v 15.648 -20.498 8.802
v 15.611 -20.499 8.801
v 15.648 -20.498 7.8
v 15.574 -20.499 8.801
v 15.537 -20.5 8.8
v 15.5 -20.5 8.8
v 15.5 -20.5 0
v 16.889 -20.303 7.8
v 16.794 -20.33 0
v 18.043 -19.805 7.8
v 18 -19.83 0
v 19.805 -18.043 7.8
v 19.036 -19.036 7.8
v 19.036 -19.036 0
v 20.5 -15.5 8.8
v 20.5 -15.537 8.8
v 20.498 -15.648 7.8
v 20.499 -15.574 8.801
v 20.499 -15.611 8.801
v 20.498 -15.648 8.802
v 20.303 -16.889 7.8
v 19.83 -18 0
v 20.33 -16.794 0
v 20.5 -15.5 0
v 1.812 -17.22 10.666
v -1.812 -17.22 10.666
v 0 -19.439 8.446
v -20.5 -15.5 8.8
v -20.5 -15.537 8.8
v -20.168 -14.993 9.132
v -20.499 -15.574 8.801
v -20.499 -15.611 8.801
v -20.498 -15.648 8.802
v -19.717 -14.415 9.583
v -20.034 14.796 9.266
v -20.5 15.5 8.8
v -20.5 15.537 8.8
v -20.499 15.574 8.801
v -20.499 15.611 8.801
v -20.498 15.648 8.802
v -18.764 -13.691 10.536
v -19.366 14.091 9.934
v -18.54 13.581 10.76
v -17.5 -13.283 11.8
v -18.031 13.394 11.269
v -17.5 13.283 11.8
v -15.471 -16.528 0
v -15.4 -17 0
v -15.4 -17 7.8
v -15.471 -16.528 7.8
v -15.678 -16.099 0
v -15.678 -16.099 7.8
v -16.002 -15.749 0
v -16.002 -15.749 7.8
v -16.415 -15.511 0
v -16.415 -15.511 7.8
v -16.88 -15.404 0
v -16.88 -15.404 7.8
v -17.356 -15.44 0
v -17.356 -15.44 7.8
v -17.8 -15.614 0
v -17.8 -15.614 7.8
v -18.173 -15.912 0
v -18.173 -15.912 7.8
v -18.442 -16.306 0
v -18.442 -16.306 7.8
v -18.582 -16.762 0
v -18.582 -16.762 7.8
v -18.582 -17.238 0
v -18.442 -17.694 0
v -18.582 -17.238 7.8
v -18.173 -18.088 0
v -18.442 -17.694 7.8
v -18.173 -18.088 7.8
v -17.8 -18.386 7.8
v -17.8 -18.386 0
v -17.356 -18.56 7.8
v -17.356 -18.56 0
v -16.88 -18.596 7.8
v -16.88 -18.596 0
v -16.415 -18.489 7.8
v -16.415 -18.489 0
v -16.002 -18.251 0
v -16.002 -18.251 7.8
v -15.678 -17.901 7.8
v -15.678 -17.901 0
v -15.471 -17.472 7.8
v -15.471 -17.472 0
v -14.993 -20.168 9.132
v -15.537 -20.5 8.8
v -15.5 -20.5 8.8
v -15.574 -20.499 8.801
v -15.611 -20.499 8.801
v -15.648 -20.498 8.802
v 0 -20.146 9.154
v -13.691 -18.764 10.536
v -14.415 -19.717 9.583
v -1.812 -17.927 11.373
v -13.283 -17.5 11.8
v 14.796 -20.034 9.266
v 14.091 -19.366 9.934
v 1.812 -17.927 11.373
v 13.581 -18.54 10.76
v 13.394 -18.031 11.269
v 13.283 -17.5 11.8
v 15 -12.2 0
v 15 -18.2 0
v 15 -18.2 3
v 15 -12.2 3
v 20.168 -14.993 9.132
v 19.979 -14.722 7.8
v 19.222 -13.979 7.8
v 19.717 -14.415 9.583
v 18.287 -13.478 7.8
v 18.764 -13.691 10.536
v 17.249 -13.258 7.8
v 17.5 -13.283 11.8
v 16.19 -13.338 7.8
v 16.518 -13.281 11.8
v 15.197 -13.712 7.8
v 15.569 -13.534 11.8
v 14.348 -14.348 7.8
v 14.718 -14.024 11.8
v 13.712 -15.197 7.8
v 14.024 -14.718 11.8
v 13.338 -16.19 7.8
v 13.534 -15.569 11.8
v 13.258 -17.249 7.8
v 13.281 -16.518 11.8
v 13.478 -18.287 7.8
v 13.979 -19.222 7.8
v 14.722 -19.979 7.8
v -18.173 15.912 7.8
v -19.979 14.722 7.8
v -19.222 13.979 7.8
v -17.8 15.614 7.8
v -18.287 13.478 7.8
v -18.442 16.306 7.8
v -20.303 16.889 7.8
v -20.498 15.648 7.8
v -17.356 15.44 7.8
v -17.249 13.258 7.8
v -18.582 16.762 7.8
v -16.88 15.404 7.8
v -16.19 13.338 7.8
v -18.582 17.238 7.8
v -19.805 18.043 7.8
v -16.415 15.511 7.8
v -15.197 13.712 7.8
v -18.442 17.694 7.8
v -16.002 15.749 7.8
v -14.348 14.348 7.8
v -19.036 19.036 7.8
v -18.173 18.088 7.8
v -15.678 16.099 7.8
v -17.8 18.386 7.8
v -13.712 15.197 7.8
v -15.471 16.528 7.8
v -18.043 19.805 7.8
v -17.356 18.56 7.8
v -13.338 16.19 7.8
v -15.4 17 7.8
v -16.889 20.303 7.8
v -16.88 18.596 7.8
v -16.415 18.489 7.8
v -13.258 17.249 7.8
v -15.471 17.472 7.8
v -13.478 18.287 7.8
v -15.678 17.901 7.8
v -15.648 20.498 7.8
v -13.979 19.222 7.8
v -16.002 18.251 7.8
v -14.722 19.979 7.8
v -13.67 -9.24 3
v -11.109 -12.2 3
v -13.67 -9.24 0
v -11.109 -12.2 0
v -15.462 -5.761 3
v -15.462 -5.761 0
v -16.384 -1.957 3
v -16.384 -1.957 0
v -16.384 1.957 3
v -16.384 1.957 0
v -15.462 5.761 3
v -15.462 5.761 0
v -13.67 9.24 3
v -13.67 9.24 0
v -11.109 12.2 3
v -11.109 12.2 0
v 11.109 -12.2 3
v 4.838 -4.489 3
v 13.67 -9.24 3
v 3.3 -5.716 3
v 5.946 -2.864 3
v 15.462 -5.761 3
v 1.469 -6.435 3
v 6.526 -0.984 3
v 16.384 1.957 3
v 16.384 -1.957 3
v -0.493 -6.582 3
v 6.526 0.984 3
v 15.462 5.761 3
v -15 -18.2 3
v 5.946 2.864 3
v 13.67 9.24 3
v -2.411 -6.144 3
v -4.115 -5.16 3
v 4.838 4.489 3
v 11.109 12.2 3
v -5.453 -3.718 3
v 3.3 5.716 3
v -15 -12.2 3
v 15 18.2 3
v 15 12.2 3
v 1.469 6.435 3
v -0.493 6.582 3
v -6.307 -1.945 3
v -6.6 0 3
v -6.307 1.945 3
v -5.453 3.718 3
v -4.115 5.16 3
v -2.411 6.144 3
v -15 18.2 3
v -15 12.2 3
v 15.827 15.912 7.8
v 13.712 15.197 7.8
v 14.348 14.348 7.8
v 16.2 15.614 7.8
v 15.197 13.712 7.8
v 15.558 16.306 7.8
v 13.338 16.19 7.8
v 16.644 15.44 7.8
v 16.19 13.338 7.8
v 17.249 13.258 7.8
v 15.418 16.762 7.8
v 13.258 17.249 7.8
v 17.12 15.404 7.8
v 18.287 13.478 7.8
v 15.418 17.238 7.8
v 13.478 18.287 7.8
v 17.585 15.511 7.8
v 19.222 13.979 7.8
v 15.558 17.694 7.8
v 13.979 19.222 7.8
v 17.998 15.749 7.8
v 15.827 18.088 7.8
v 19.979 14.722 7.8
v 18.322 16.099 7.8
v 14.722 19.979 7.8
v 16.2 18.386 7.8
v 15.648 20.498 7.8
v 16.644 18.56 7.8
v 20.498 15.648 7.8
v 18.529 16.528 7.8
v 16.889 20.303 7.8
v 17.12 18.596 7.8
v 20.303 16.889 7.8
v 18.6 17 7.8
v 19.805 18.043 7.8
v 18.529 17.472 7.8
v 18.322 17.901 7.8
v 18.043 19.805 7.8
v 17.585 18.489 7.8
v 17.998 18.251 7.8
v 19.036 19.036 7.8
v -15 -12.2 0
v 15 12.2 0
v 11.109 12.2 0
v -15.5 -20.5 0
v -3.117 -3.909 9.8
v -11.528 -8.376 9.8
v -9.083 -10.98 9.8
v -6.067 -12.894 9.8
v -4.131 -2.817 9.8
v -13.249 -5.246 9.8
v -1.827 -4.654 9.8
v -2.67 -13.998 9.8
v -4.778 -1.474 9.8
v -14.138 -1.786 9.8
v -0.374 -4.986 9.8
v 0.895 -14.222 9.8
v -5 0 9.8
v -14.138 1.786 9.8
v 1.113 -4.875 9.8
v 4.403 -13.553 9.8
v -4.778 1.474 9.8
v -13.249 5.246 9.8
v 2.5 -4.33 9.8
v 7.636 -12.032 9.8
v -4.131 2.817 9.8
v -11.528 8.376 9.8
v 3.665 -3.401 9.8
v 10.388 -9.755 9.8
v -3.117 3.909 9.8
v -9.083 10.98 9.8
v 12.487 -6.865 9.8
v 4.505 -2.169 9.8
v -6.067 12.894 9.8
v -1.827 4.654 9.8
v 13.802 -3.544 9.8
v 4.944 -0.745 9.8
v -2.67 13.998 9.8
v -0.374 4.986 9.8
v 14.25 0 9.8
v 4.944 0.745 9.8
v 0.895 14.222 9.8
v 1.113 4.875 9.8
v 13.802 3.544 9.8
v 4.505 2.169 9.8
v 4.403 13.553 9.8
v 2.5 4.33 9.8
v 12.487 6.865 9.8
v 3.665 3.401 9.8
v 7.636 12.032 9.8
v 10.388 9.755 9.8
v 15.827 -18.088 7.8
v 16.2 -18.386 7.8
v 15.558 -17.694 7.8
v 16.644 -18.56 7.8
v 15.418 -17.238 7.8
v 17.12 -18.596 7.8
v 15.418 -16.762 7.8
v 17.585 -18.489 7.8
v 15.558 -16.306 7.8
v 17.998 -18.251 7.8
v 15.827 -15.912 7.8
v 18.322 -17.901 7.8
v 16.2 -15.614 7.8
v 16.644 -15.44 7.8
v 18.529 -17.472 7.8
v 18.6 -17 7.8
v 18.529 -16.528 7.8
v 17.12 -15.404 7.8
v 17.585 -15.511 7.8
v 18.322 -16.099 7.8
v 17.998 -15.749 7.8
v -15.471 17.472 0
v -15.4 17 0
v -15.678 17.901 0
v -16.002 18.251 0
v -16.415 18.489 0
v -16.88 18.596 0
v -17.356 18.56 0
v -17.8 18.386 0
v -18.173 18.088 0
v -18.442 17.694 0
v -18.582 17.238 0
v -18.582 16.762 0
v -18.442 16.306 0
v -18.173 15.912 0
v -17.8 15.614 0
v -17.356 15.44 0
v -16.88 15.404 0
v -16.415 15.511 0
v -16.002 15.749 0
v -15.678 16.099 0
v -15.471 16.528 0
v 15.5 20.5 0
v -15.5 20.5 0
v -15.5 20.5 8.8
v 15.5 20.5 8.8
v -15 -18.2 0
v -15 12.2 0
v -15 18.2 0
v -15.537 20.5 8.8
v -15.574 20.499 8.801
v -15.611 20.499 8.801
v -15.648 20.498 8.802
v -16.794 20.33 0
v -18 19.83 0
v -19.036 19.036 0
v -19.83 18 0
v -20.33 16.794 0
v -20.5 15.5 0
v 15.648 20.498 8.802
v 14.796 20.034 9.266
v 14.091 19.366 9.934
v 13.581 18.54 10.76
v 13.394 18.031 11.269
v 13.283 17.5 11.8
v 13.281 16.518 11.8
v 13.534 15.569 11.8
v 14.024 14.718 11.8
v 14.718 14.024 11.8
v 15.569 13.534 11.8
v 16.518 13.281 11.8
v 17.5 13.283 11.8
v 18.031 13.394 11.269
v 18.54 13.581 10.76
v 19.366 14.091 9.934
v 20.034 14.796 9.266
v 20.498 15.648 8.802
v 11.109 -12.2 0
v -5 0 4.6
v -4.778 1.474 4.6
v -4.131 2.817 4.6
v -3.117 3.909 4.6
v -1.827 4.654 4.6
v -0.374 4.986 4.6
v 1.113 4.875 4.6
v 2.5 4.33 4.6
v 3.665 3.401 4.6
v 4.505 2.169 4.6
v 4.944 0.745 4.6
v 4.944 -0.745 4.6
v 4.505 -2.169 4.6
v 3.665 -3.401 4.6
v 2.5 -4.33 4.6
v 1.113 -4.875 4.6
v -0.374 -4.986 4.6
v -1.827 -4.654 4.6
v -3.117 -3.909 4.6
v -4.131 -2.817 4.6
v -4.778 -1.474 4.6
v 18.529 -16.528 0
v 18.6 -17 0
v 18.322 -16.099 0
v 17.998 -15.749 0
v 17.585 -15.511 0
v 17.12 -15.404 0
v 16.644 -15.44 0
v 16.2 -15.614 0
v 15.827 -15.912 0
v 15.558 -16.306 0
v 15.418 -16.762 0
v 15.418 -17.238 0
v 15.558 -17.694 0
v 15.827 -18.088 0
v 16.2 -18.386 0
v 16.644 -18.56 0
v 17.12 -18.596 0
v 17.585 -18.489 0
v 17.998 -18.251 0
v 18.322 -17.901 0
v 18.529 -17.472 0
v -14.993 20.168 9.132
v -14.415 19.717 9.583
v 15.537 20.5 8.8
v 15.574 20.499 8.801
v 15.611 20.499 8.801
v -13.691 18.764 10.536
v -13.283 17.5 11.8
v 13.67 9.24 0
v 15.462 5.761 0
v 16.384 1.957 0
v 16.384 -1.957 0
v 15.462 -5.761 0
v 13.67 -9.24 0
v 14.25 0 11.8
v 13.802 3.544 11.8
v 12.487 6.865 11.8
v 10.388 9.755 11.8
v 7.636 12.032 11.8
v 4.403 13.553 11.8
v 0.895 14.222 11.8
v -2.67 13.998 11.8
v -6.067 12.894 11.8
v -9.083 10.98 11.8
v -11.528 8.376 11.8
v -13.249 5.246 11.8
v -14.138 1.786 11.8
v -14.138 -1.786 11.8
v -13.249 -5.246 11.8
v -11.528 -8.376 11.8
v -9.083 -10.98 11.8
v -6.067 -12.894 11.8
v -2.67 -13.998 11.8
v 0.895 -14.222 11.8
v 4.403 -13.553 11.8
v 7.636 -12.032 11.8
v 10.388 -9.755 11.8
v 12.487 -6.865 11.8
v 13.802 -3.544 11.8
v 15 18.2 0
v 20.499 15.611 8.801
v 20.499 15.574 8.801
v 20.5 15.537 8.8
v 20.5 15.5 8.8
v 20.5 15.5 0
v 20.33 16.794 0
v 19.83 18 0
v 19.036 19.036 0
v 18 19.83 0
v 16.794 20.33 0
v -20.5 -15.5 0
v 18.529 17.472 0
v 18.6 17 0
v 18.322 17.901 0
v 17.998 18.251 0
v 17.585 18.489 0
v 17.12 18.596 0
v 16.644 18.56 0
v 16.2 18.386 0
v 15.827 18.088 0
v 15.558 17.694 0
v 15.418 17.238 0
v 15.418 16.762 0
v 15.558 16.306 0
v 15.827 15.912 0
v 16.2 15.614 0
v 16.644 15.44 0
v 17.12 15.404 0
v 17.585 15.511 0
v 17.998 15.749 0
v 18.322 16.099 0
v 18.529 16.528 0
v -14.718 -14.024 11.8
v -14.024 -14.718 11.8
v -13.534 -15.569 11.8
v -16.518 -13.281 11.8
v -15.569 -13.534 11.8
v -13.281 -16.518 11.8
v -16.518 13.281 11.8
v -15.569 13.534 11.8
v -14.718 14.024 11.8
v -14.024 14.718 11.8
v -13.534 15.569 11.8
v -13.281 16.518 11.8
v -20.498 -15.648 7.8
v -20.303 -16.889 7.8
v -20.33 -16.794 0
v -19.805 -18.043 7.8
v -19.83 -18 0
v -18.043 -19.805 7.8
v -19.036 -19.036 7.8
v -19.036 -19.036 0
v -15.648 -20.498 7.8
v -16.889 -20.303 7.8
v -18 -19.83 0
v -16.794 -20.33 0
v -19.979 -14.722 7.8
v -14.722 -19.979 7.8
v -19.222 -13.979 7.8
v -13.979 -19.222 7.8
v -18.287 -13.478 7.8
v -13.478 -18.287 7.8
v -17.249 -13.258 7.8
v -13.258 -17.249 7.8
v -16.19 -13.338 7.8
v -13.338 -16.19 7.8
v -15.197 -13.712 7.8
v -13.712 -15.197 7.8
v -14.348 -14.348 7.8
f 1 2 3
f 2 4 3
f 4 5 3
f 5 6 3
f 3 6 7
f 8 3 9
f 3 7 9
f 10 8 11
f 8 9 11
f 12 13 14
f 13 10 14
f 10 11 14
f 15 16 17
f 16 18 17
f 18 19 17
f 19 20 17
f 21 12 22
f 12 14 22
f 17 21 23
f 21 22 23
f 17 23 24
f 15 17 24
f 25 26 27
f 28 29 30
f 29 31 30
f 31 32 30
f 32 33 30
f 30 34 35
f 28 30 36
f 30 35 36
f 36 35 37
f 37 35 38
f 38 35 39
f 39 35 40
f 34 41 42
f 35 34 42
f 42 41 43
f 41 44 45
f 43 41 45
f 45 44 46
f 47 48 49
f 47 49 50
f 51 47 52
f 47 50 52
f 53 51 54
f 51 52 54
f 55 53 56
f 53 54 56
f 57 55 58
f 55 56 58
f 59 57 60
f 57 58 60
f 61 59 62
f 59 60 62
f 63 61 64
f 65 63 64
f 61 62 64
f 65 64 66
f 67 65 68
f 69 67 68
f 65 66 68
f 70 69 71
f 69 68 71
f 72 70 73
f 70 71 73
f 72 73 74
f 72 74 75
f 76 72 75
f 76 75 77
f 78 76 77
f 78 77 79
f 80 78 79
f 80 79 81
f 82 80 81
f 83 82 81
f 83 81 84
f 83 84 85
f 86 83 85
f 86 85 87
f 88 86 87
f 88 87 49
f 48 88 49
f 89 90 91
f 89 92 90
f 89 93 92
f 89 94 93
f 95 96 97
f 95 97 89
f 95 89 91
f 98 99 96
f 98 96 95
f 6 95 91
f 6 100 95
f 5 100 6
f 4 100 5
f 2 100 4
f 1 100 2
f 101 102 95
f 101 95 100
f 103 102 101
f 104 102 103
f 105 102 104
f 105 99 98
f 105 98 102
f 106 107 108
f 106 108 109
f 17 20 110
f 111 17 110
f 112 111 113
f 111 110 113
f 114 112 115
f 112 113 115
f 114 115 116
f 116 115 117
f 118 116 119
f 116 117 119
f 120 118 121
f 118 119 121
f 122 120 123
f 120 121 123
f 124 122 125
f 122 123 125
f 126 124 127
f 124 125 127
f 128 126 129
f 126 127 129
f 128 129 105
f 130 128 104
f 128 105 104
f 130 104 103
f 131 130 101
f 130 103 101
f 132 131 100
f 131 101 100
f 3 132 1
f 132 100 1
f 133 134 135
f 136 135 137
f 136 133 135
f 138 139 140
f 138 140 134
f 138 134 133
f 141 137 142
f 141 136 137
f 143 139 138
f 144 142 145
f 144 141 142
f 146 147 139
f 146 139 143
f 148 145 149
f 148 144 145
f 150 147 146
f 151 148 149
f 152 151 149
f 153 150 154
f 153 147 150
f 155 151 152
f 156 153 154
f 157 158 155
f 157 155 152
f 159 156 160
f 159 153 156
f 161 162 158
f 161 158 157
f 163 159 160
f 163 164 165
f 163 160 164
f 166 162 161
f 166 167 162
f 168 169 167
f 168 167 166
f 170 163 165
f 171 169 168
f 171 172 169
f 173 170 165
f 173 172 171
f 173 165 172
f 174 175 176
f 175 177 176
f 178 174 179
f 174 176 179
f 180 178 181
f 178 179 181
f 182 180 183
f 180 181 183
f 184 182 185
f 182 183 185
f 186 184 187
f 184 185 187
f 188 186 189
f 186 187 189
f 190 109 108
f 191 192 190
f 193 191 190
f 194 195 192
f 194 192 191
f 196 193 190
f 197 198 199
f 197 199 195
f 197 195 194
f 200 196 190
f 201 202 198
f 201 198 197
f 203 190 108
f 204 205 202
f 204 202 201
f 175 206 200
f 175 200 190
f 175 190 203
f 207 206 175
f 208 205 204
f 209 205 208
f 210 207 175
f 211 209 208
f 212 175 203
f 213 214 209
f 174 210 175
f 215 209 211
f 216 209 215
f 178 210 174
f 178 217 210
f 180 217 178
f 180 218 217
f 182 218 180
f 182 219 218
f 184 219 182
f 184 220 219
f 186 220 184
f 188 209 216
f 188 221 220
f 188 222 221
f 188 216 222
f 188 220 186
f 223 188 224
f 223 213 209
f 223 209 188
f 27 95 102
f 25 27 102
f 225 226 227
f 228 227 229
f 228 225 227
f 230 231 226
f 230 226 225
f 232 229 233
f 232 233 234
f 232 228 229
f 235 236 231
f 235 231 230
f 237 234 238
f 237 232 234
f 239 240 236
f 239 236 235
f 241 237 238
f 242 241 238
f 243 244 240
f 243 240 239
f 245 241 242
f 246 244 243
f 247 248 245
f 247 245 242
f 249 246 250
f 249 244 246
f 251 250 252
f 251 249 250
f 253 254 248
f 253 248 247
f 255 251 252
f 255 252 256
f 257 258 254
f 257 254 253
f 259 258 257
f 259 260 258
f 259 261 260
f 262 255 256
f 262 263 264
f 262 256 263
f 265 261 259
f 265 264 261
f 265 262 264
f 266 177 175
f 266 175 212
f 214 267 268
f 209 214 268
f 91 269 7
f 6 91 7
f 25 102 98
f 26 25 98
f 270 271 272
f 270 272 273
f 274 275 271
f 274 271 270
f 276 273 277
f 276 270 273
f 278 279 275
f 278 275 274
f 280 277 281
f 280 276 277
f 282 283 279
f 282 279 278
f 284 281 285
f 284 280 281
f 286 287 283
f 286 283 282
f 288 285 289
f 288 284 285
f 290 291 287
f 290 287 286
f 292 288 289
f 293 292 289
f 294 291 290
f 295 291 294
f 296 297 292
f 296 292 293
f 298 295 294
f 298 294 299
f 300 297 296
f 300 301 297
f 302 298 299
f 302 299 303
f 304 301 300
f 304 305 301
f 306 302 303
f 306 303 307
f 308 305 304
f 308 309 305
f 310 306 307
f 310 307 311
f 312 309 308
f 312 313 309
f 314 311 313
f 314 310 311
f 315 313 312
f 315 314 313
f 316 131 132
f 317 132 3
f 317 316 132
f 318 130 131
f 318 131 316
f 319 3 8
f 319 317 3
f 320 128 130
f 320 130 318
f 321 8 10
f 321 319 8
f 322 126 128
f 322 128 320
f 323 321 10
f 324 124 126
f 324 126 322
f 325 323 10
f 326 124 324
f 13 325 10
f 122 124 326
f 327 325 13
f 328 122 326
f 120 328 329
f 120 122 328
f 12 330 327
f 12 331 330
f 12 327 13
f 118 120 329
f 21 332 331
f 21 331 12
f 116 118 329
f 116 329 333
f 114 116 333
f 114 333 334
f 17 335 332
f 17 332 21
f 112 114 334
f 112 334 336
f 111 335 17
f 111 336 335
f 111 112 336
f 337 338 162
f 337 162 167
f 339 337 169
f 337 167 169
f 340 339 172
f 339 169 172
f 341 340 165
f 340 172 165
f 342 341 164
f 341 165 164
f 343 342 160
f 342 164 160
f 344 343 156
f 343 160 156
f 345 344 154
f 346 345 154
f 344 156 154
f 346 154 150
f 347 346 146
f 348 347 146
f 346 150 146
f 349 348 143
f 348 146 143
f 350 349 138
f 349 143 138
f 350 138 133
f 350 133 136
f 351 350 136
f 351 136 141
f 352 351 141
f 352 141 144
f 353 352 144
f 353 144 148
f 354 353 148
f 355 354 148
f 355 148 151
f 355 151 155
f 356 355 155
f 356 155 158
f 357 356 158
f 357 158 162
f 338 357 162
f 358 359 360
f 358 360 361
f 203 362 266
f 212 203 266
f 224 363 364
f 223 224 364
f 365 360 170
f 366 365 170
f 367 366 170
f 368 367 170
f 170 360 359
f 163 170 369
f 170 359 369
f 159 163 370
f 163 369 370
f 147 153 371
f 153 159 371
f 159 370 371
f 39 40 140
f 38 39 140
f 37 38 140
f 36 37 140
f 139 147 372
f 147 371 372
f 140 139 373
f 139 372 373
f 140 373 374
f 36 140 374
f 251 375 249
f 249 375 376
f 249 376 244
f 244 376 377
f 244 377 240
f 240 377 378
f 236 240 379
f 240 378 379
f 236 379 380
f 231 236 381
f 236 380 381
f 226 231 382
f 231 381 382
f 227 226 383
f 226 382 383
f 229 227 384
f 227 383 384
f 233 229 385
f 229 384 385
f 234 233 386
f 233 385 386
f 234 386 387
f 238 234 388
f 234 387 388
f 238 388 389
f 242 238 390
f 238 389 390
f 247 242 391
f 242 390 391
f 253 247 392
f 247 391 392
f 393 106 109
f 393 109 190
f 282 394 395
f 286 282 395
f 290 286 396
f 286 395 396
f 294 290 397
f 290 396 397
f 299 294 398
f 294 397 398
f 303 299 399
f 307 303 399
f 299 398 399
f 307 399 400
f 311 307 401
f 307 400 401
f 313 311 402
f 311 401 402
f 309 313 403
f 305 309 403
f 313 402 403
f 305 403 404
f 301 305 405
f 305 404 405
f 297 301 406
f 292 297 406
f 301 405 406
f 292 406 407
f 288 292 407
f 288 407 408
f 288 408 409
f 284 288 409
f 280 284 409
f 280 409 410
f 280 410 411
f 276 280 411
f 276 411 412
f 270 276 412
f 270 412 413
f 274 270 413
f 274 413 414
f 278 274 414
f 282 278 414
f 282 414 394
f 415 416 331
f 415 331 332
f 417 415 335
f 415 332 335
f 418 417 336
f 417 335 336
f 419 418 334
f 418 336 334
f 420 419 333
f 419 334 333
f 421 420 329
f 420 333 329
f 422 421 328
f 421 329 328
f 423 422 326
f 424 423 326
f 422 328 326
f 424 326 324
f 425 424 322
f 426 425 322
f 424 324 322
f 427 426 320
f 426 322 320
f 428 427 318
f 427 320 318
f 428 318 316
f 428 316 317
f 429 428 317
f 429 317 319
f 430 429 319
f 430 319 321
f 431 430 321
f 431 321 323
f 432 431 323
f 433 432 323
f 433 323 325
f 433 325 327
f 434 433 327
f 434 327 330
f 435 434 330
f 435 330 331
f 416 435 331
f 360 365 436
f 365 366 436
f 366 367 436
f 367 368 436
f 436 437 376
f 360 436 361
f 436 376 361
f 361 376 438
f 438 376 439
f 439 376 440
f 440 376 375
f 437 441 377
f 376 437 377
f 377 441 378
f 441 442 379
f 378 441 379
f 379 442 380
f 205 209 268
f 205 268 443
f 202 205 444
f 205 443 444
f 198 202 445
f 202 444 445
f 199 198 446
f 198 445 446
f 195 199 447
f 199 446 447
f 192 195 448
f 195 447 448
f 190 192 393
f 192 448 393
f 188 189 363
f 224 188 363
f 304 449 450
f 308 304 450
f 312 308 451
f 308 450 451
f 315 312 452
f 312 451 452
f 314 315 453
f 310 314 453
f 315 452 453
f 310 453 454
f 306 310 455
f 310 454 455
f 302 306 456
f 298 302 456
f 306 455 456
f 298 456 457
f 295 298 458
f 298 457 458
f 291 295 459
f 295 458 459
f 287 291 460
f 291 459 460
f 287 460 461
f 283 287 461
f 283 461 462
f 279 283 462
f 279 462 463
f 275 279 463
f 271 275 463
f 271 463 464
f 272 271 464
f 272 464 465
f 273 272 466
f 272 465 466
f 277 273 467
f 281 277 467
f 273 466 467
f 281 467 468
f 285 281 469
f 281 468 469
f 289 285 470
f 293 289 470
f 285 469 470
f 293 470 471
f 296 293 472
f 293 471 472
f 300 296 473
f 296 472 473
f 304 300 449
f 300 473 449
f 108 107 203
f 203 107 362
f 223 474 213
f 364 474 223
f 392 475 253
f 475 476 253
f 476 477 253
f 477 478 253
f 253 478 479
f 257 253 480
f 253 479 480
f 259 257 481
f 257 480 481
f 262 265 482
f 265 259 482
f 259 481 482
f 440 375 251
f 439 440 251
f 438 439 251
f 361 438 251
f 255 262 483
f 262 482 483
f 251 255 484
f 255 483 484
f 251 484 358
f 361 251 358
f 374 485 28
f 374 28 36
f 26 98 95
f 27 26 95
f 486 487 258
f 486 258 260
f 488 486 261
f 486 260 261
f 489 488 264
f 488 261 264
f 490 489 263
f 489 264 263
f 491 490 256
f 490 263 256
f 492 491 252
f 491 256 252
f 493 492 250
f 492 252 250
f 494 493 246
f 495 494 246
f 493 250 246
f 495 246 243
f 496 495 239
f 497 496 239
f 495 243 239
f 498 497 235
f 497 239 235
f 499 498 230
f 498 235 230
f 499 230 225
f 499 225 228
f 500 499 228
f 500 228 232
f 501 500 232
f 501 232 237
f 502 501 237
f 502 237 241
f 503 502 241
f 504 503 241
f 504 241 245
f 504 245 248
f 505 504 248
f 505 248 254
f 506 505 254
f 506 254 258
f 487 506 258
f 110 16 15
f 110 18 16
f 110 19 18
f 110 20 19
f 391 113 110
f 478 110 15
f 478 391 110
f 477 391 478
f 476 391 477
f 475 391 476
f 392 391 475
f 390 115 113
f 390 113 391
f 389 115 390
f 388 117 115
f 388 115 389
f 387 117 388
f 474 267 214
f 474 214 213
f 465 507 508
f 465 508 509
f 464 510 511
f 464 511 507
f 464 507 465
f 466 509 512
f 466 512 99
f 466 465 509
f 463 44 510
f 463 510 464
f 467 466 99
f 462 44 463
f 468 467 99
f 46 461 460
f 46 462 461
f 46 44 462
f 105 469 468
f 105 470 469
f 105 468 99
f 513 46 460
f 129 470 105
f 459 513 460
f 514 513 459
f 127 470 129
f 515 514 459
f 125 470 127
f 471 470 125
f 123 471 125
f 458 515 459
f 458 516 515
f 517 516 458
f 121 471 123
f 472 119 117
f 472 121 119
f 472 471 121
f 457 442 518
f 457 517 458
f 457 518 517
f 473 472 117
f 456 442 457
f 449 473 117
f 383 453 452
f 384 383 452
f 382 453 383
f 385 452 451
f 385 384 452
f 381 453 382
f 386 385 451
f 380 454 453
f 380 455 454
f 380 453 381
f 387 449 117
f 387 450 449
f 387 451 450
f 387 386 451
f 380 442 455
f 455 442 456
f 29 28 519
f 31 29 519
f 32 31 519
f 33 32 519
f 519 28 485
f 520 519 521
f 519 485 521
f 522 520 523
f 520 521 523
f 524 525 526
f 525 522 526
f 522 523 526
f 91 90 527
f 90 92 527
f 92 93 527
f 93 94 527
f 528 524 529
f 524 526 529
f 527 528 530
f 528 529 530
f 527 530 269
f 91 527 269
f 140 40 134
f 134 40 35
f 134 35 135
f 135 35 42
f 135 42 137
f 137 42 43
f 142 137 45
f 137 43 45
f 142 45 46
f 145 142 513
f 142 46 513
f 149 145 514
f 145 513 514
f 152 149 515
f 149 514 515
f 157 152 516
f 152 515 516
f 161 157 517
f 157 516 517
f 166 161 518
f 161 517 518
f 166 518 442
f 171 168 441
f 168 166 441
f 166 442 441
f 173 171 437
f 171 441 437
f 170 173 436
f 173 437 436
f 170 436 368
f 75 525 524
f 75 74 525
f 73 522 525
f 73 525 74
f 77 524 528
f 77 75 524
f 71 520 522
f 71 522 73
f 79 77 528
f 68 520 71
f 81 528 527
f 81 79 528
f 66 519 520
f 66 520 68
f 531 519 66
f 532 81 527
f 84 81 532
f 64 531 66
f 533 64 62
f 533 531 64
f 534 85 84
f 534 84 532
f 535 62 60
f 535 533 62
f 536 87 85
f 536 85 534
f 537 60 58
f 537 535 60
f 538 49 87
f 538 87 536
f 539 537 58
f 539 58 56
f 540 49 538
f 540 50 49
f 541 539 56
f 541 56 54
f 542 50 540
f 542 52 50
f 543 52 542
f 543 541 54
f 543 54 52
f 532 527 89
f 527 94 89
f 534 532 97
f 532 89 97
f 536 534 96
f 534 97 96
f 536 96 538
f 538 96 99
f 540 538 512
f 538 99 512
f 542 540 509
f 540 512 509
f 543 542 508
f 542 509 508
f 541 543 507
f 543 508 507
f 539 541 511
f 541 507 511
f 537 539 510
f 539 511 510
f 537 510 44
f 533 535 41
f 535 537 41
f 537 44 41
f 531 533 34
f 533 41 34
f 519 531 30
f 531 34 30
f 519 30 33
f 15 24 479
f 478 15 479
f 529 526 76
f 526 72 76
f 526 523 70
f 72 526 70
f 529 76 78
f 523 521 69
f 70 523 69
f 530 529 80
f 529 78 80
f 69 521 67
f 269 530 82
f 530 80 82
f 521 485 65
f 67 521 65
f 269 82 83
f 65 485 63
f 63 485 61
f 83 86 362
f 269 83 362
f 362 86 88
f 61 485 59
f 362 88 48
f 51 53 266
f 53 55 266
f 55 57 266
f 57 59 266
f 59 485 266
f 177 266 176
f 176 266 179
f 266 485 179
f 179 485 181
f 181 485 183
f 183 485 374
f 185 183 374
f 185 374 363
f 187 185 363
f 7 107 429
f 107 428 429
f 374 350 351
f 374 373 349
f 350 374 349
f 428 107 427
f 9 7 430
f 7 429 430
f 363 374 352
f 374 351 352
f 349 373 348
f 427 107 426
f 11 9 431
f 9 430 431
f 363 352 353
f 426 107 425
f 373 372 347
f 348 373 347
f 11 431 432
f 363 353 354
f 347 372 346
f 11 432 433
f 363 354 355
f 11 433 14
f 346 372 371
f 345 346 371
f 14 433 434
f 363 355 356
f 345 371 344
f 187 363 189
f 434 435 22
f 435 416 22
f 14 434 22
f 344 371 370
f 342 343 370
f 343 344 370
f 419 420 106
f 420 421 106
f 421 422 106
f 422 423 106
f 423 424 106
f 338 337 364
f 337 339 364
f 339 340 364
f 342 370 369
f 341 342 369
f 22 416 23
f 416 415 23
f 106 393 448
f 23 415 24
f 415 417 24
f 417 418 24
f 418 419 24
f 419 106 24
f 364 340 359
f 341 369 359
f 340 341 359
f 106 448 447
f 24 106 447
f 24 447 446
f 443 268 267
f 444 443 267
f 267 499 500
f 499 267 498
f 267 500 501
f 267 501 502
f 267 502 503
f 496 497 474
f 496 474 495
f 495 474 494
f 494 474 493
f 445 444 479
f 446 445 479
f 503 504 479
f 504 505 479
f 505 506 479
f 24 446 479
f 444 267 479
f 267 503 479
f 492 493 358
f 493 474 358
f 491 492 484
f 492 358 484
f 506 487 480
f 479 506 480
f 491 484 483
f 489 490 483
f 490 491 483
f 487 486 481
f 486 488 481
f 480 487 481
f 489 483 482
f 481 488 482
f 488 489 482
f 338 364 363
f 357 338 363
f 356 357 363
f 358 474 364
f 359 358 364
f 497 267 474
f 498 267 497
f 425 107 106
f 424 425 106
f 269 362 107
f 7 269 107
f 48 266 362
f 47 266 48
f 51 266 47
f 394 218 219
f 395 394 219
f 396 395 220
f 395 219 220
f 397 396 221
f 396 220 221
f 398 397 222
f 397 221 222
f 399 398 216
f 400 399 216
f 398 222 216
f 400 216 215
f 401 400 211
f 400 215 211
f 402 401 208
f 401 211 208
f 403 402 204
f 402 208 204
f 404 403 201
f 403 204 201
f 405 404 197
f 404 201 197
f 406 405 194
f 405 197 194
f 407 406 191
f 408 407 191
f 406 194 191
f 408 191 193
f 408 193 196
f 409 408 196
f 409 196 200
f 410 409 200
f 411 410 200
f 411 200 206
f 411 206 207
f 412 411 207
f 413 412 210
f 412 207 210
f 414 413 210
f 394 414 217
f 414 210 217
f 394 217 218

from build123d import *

# Parameters (mm, degrees)
SKETCH_1_W          = 41
SKETCH_1_H          = 41
EXTRUDE_1_DEPTH     = 11.8
CHAMFER_1_SIZE      = 3
FILLET_1_R          = 5
SKETCH_3_R          = 16.5
CUT_EXTRUDE_2_DEPTH = 3
SKETCH_4_R          = 5
CUT_EXTRUDE_3_DEPTH = 31.297524651
SKETCH_5_W          = 30
SKETCH_5_H          = 6
CUT_EXTRUDE_4_DEPTH = 3
CHAMFER_2_SIZE      = 1.6
SKETCH_6_R          = 14.25
CUT_EXTRUDE_5_DEPTH = 2
CUT_EXTRUDE_6_DEPTH = 1
SKETCH_8_R          = 1.6
CUT_EXTRUDE_7_DEPTH = 32.300798712
SKETCH_9_R          = 3.75
CUT_EXTRUDE_8_DEPTH = 4


with BuildPart() as part:
    # ｽｹｯﾁ1 → ﾎﾞｽ - 押し出し1 (new body)
    with BuildSketch(Plane.XY):
        Rectangle(SKETCH_1_W, SKETCH_1_H)
    extrude(amount=EXTRUDE_1_DEPTH)

    # 面取り1
    chamfer_1_edges = [part.edges().sort_by_distance(p)[0] for p in [
        (-20.5, 0, 11.8),
        (0, -20.5, 11.8),
        (20.5, 0, 11.8),
        (0, 20.5, 11.8),
    ]]
    chamfer(chamfer_1_edges, length=CHAMFER_1_SIZE)

    # ﾌｨﾚｯﾄ1
    # the kernel refuses this fillet: 5 mm, written as the material it takes off along each edge
    with BuildSketch(Plane(origin=(20.5, -20.5, -12.5), x_dir=(-1, 0, 0), z_dir=(0, 0, 1)), Plane(origin=(20.5, 20.5, -12.5), x_dir=(0, -1, 0), z_dir=(0, 0, 1))) as fillet_1_piece_1:
        with BuildLine():
            CenterArc((FILLET_1_R, -FILLET_1_R), FILLET_1_R, 90, 90)
            Line((0, -FILLET_1_R), (0, 0))
            Line((0, 0), (FILLET_1_R, 0))
        make_face()
    extrude(amount=33.8, mode=Mode.SUBTRACT)
    with BuildSketch(Plane(origin=(-20.5, -20.5, -12.5), x_dir=(1, 0, 0), z_dir=(0, 0, 1)), Plane(origin=(-20.5, 20.5, -12.5), x_dir=(0, -1, 0), z_dir=(0, 0, 1))) as fillet_1_piece_2:
        with BuildLine():
            CenterArc((FILLET_1_R, FILLET_1_R), FILLET_1_R, 180, 90)
            Line((0, FILLET_1_R), (0, 0))
            Line((0, 0), (FILLET_1_R, 0))
        make_face()
    extrude(amount=33.8, mode=Mode.SUBTRACT)
    with BuildSketch(Plane(origin=(-24.666666667, 24.666666667, 4.633333333), x_dir=(-0.408248290463863, -0.816496580927726, -0.408248290463863), z_dir=(0.5773502691896258, -0.5773502691896258, 0.5773502691896258)), Plane(origin=(-24.666666667, -24.666666667, 4.633333333), x_dir=(0.816496580927726, -0.408248290463863, -0.408248290463863), z_dir=(0.5773502691896258, 0.5773502691896258, 0.5773502691896258))) as fillet_1_piece_3:
        with BuildLine():
            CenterArc((FILLET_1_R * 0.57735026919, FILLET_1_R), FILLET_1_R, 210, 60)
            Line((-FILLET_1_R * 0.288675134595, FILLET_1_R * 0.5), (0, 0))
            Line((0, 0), (FILLET_1_R * 0.57735026919, 0))
        make_face()
    extrude(amount=19.629909152, mode=Mode.SUBTRACT)
    with BuildSketch(Plane(origin=(24.666666667, 24.666666667, 4.633333333), x_dir=(0.40824829046386313, -0.816496580927726, -0.40824829046386285), z_dir=(-0.5773502691896258, -0.5773502691896258, 0.5773502691896258)), Plane(origin=(24.666666667, -24.666666667, 4.633333333), x_dir=(-0.816496580927726, -0.40824829046386285, -0.4082482904638632), z_dir=(-0.5773502691896258, 0.5773502691896258, 0.5773502691896258))) as fillet_1_piece_4:
        with BuildLine():
            CenterArc((FILLET_1_R * 0.57735026919, -FILLET_1_R), FILLET_1_R, 90, 60)
            Line((-FILLET_1_R * 0.288675134595, -FILLET_1_R * 0.5), (0, 0))
            Line((0, 0), (FILLET_1_R * 0.57735026919, 0))
        make_face()
    extrude(amount=19.629909152, mode=Mode.SUBTRACT)

    # ｽｹｯﾁ3 → ｶｯﾄ - 押し出し2 (cut)
    with BuildSketch(Plane(origin=(0, 0, 0), x_dir=(-1, 0, 0), z_dir=(0, 0, -1))):
        Circle(SKETCH_3_R)
    extrude(amount=-CUT_EXTRUDE_2_DEPTH, mode=Mode.SUBTRACT)

    # ｽｹｯﾁ4 → ｶｯﾄ - 押し出し3 (cut, through all)
    with BuildSketch(Plane(origin=(0, 0, 3), x_dir=(-1, 0, 0), z_dir=(0, 0, -1))):
        Circle(SKETCH_4_R)
    extrude(amount=-CUT_EXTRUDE_3_DEPTH, mode=Mode.SUBTRACT)

    # ｽｹｯﾁ5 → ｶｯﾄ - 押し出し4 (cut)
    with BuildSketch(Plane(origin=(0, 0, 0), x_dir=(-1, 0, 0), z_dir=(0, 0, -1))):
        with Locations((0, 15.2)):
            Rectangle(SKETCH_5_W, SKETCH_5_H)
        with Locations((0, -15.2)):
            Rectangle(SKETCH_5_W, SKETCH_5_H)
    extrude(amount=-CUT_EXTRUDE_4_DEPTH, mode=Mode.SUBTRACT)

    # 面取り2
    chamfer_2_edges = [part.edges().sort_by_distance(p)[0] for p in [
        (5, 0, 3),
    ]]
    chamfer(chamfer_2_edges, length=CHAMFER_2_SIZE)

    # ｽｹｯﾁ6 → ｶｯﾄ - 押し出し5 (cut)
    with BuildSketch(Plane.XY.offset(11.8)):
        Circle(SKETCH_6_R)
    extrude(amount=-CUT_EXTRUDE_5_DEPTH, mode=Mode.SUBTRACT)

    # ｽｹｯﾁ7 → ｶｯﾄ - 押し出し6 (cut)
    with BuildSketch(Plane(origin=(0, -14.65, 14.65), x_dir=(1, 0, 0), z_dir=(0, -0.7071067811865491, 0.707106781186546))):
        Polygon((0, -7.77314934), (1.812279996, -4.634188309), (-1.812279996, -4.634188309), align=None)
    extrude(amount=-CUT_EXTRUDE_6_DEPTH, mode=Mode.SUBTRACT)

    # ｽｹｯﾁ8 → ｶｯﾄ - 押し出し7 (cut, through all)
    with BuildSketch(Plane.XY.offset(11.8)):
        with Locations((-17, 17)):
            Circle(SKETCH_8_R)
        with Locations((-17, -17)):
            Circle(SKETCH_8_R)
        with Locations((17, -17)):
            Circle(SKETCH_8_R)
        with Locations((17, 17)):
            Circle(SKETCH_8_R)
    extrude(amount=-CUT_EXTRUDE_7_DEPTH, mode=Mode.SUBTRACT)

    # ｽｹｯﾁ9 → ｶｯﾄ - 押し出し8 (cut)
    with BuildSketch(Plane.XY.offset(11.8)):
        with Locations((17, 17)):
            Circle(SKETCH_9_R)
        with Locations((-17, 17)):
            Circle(SKETCH_9_R)
        with Locations((-17, -17)):
            Circle(SKETCH_9_R)
        with Locations((17, -17)):
            Circle(SKETCH_9_R)
    extrude(amount=-CUT_EXTRUDE_8_DEPTH, mode=Mode.SUBTRACT)


solid = part.part
